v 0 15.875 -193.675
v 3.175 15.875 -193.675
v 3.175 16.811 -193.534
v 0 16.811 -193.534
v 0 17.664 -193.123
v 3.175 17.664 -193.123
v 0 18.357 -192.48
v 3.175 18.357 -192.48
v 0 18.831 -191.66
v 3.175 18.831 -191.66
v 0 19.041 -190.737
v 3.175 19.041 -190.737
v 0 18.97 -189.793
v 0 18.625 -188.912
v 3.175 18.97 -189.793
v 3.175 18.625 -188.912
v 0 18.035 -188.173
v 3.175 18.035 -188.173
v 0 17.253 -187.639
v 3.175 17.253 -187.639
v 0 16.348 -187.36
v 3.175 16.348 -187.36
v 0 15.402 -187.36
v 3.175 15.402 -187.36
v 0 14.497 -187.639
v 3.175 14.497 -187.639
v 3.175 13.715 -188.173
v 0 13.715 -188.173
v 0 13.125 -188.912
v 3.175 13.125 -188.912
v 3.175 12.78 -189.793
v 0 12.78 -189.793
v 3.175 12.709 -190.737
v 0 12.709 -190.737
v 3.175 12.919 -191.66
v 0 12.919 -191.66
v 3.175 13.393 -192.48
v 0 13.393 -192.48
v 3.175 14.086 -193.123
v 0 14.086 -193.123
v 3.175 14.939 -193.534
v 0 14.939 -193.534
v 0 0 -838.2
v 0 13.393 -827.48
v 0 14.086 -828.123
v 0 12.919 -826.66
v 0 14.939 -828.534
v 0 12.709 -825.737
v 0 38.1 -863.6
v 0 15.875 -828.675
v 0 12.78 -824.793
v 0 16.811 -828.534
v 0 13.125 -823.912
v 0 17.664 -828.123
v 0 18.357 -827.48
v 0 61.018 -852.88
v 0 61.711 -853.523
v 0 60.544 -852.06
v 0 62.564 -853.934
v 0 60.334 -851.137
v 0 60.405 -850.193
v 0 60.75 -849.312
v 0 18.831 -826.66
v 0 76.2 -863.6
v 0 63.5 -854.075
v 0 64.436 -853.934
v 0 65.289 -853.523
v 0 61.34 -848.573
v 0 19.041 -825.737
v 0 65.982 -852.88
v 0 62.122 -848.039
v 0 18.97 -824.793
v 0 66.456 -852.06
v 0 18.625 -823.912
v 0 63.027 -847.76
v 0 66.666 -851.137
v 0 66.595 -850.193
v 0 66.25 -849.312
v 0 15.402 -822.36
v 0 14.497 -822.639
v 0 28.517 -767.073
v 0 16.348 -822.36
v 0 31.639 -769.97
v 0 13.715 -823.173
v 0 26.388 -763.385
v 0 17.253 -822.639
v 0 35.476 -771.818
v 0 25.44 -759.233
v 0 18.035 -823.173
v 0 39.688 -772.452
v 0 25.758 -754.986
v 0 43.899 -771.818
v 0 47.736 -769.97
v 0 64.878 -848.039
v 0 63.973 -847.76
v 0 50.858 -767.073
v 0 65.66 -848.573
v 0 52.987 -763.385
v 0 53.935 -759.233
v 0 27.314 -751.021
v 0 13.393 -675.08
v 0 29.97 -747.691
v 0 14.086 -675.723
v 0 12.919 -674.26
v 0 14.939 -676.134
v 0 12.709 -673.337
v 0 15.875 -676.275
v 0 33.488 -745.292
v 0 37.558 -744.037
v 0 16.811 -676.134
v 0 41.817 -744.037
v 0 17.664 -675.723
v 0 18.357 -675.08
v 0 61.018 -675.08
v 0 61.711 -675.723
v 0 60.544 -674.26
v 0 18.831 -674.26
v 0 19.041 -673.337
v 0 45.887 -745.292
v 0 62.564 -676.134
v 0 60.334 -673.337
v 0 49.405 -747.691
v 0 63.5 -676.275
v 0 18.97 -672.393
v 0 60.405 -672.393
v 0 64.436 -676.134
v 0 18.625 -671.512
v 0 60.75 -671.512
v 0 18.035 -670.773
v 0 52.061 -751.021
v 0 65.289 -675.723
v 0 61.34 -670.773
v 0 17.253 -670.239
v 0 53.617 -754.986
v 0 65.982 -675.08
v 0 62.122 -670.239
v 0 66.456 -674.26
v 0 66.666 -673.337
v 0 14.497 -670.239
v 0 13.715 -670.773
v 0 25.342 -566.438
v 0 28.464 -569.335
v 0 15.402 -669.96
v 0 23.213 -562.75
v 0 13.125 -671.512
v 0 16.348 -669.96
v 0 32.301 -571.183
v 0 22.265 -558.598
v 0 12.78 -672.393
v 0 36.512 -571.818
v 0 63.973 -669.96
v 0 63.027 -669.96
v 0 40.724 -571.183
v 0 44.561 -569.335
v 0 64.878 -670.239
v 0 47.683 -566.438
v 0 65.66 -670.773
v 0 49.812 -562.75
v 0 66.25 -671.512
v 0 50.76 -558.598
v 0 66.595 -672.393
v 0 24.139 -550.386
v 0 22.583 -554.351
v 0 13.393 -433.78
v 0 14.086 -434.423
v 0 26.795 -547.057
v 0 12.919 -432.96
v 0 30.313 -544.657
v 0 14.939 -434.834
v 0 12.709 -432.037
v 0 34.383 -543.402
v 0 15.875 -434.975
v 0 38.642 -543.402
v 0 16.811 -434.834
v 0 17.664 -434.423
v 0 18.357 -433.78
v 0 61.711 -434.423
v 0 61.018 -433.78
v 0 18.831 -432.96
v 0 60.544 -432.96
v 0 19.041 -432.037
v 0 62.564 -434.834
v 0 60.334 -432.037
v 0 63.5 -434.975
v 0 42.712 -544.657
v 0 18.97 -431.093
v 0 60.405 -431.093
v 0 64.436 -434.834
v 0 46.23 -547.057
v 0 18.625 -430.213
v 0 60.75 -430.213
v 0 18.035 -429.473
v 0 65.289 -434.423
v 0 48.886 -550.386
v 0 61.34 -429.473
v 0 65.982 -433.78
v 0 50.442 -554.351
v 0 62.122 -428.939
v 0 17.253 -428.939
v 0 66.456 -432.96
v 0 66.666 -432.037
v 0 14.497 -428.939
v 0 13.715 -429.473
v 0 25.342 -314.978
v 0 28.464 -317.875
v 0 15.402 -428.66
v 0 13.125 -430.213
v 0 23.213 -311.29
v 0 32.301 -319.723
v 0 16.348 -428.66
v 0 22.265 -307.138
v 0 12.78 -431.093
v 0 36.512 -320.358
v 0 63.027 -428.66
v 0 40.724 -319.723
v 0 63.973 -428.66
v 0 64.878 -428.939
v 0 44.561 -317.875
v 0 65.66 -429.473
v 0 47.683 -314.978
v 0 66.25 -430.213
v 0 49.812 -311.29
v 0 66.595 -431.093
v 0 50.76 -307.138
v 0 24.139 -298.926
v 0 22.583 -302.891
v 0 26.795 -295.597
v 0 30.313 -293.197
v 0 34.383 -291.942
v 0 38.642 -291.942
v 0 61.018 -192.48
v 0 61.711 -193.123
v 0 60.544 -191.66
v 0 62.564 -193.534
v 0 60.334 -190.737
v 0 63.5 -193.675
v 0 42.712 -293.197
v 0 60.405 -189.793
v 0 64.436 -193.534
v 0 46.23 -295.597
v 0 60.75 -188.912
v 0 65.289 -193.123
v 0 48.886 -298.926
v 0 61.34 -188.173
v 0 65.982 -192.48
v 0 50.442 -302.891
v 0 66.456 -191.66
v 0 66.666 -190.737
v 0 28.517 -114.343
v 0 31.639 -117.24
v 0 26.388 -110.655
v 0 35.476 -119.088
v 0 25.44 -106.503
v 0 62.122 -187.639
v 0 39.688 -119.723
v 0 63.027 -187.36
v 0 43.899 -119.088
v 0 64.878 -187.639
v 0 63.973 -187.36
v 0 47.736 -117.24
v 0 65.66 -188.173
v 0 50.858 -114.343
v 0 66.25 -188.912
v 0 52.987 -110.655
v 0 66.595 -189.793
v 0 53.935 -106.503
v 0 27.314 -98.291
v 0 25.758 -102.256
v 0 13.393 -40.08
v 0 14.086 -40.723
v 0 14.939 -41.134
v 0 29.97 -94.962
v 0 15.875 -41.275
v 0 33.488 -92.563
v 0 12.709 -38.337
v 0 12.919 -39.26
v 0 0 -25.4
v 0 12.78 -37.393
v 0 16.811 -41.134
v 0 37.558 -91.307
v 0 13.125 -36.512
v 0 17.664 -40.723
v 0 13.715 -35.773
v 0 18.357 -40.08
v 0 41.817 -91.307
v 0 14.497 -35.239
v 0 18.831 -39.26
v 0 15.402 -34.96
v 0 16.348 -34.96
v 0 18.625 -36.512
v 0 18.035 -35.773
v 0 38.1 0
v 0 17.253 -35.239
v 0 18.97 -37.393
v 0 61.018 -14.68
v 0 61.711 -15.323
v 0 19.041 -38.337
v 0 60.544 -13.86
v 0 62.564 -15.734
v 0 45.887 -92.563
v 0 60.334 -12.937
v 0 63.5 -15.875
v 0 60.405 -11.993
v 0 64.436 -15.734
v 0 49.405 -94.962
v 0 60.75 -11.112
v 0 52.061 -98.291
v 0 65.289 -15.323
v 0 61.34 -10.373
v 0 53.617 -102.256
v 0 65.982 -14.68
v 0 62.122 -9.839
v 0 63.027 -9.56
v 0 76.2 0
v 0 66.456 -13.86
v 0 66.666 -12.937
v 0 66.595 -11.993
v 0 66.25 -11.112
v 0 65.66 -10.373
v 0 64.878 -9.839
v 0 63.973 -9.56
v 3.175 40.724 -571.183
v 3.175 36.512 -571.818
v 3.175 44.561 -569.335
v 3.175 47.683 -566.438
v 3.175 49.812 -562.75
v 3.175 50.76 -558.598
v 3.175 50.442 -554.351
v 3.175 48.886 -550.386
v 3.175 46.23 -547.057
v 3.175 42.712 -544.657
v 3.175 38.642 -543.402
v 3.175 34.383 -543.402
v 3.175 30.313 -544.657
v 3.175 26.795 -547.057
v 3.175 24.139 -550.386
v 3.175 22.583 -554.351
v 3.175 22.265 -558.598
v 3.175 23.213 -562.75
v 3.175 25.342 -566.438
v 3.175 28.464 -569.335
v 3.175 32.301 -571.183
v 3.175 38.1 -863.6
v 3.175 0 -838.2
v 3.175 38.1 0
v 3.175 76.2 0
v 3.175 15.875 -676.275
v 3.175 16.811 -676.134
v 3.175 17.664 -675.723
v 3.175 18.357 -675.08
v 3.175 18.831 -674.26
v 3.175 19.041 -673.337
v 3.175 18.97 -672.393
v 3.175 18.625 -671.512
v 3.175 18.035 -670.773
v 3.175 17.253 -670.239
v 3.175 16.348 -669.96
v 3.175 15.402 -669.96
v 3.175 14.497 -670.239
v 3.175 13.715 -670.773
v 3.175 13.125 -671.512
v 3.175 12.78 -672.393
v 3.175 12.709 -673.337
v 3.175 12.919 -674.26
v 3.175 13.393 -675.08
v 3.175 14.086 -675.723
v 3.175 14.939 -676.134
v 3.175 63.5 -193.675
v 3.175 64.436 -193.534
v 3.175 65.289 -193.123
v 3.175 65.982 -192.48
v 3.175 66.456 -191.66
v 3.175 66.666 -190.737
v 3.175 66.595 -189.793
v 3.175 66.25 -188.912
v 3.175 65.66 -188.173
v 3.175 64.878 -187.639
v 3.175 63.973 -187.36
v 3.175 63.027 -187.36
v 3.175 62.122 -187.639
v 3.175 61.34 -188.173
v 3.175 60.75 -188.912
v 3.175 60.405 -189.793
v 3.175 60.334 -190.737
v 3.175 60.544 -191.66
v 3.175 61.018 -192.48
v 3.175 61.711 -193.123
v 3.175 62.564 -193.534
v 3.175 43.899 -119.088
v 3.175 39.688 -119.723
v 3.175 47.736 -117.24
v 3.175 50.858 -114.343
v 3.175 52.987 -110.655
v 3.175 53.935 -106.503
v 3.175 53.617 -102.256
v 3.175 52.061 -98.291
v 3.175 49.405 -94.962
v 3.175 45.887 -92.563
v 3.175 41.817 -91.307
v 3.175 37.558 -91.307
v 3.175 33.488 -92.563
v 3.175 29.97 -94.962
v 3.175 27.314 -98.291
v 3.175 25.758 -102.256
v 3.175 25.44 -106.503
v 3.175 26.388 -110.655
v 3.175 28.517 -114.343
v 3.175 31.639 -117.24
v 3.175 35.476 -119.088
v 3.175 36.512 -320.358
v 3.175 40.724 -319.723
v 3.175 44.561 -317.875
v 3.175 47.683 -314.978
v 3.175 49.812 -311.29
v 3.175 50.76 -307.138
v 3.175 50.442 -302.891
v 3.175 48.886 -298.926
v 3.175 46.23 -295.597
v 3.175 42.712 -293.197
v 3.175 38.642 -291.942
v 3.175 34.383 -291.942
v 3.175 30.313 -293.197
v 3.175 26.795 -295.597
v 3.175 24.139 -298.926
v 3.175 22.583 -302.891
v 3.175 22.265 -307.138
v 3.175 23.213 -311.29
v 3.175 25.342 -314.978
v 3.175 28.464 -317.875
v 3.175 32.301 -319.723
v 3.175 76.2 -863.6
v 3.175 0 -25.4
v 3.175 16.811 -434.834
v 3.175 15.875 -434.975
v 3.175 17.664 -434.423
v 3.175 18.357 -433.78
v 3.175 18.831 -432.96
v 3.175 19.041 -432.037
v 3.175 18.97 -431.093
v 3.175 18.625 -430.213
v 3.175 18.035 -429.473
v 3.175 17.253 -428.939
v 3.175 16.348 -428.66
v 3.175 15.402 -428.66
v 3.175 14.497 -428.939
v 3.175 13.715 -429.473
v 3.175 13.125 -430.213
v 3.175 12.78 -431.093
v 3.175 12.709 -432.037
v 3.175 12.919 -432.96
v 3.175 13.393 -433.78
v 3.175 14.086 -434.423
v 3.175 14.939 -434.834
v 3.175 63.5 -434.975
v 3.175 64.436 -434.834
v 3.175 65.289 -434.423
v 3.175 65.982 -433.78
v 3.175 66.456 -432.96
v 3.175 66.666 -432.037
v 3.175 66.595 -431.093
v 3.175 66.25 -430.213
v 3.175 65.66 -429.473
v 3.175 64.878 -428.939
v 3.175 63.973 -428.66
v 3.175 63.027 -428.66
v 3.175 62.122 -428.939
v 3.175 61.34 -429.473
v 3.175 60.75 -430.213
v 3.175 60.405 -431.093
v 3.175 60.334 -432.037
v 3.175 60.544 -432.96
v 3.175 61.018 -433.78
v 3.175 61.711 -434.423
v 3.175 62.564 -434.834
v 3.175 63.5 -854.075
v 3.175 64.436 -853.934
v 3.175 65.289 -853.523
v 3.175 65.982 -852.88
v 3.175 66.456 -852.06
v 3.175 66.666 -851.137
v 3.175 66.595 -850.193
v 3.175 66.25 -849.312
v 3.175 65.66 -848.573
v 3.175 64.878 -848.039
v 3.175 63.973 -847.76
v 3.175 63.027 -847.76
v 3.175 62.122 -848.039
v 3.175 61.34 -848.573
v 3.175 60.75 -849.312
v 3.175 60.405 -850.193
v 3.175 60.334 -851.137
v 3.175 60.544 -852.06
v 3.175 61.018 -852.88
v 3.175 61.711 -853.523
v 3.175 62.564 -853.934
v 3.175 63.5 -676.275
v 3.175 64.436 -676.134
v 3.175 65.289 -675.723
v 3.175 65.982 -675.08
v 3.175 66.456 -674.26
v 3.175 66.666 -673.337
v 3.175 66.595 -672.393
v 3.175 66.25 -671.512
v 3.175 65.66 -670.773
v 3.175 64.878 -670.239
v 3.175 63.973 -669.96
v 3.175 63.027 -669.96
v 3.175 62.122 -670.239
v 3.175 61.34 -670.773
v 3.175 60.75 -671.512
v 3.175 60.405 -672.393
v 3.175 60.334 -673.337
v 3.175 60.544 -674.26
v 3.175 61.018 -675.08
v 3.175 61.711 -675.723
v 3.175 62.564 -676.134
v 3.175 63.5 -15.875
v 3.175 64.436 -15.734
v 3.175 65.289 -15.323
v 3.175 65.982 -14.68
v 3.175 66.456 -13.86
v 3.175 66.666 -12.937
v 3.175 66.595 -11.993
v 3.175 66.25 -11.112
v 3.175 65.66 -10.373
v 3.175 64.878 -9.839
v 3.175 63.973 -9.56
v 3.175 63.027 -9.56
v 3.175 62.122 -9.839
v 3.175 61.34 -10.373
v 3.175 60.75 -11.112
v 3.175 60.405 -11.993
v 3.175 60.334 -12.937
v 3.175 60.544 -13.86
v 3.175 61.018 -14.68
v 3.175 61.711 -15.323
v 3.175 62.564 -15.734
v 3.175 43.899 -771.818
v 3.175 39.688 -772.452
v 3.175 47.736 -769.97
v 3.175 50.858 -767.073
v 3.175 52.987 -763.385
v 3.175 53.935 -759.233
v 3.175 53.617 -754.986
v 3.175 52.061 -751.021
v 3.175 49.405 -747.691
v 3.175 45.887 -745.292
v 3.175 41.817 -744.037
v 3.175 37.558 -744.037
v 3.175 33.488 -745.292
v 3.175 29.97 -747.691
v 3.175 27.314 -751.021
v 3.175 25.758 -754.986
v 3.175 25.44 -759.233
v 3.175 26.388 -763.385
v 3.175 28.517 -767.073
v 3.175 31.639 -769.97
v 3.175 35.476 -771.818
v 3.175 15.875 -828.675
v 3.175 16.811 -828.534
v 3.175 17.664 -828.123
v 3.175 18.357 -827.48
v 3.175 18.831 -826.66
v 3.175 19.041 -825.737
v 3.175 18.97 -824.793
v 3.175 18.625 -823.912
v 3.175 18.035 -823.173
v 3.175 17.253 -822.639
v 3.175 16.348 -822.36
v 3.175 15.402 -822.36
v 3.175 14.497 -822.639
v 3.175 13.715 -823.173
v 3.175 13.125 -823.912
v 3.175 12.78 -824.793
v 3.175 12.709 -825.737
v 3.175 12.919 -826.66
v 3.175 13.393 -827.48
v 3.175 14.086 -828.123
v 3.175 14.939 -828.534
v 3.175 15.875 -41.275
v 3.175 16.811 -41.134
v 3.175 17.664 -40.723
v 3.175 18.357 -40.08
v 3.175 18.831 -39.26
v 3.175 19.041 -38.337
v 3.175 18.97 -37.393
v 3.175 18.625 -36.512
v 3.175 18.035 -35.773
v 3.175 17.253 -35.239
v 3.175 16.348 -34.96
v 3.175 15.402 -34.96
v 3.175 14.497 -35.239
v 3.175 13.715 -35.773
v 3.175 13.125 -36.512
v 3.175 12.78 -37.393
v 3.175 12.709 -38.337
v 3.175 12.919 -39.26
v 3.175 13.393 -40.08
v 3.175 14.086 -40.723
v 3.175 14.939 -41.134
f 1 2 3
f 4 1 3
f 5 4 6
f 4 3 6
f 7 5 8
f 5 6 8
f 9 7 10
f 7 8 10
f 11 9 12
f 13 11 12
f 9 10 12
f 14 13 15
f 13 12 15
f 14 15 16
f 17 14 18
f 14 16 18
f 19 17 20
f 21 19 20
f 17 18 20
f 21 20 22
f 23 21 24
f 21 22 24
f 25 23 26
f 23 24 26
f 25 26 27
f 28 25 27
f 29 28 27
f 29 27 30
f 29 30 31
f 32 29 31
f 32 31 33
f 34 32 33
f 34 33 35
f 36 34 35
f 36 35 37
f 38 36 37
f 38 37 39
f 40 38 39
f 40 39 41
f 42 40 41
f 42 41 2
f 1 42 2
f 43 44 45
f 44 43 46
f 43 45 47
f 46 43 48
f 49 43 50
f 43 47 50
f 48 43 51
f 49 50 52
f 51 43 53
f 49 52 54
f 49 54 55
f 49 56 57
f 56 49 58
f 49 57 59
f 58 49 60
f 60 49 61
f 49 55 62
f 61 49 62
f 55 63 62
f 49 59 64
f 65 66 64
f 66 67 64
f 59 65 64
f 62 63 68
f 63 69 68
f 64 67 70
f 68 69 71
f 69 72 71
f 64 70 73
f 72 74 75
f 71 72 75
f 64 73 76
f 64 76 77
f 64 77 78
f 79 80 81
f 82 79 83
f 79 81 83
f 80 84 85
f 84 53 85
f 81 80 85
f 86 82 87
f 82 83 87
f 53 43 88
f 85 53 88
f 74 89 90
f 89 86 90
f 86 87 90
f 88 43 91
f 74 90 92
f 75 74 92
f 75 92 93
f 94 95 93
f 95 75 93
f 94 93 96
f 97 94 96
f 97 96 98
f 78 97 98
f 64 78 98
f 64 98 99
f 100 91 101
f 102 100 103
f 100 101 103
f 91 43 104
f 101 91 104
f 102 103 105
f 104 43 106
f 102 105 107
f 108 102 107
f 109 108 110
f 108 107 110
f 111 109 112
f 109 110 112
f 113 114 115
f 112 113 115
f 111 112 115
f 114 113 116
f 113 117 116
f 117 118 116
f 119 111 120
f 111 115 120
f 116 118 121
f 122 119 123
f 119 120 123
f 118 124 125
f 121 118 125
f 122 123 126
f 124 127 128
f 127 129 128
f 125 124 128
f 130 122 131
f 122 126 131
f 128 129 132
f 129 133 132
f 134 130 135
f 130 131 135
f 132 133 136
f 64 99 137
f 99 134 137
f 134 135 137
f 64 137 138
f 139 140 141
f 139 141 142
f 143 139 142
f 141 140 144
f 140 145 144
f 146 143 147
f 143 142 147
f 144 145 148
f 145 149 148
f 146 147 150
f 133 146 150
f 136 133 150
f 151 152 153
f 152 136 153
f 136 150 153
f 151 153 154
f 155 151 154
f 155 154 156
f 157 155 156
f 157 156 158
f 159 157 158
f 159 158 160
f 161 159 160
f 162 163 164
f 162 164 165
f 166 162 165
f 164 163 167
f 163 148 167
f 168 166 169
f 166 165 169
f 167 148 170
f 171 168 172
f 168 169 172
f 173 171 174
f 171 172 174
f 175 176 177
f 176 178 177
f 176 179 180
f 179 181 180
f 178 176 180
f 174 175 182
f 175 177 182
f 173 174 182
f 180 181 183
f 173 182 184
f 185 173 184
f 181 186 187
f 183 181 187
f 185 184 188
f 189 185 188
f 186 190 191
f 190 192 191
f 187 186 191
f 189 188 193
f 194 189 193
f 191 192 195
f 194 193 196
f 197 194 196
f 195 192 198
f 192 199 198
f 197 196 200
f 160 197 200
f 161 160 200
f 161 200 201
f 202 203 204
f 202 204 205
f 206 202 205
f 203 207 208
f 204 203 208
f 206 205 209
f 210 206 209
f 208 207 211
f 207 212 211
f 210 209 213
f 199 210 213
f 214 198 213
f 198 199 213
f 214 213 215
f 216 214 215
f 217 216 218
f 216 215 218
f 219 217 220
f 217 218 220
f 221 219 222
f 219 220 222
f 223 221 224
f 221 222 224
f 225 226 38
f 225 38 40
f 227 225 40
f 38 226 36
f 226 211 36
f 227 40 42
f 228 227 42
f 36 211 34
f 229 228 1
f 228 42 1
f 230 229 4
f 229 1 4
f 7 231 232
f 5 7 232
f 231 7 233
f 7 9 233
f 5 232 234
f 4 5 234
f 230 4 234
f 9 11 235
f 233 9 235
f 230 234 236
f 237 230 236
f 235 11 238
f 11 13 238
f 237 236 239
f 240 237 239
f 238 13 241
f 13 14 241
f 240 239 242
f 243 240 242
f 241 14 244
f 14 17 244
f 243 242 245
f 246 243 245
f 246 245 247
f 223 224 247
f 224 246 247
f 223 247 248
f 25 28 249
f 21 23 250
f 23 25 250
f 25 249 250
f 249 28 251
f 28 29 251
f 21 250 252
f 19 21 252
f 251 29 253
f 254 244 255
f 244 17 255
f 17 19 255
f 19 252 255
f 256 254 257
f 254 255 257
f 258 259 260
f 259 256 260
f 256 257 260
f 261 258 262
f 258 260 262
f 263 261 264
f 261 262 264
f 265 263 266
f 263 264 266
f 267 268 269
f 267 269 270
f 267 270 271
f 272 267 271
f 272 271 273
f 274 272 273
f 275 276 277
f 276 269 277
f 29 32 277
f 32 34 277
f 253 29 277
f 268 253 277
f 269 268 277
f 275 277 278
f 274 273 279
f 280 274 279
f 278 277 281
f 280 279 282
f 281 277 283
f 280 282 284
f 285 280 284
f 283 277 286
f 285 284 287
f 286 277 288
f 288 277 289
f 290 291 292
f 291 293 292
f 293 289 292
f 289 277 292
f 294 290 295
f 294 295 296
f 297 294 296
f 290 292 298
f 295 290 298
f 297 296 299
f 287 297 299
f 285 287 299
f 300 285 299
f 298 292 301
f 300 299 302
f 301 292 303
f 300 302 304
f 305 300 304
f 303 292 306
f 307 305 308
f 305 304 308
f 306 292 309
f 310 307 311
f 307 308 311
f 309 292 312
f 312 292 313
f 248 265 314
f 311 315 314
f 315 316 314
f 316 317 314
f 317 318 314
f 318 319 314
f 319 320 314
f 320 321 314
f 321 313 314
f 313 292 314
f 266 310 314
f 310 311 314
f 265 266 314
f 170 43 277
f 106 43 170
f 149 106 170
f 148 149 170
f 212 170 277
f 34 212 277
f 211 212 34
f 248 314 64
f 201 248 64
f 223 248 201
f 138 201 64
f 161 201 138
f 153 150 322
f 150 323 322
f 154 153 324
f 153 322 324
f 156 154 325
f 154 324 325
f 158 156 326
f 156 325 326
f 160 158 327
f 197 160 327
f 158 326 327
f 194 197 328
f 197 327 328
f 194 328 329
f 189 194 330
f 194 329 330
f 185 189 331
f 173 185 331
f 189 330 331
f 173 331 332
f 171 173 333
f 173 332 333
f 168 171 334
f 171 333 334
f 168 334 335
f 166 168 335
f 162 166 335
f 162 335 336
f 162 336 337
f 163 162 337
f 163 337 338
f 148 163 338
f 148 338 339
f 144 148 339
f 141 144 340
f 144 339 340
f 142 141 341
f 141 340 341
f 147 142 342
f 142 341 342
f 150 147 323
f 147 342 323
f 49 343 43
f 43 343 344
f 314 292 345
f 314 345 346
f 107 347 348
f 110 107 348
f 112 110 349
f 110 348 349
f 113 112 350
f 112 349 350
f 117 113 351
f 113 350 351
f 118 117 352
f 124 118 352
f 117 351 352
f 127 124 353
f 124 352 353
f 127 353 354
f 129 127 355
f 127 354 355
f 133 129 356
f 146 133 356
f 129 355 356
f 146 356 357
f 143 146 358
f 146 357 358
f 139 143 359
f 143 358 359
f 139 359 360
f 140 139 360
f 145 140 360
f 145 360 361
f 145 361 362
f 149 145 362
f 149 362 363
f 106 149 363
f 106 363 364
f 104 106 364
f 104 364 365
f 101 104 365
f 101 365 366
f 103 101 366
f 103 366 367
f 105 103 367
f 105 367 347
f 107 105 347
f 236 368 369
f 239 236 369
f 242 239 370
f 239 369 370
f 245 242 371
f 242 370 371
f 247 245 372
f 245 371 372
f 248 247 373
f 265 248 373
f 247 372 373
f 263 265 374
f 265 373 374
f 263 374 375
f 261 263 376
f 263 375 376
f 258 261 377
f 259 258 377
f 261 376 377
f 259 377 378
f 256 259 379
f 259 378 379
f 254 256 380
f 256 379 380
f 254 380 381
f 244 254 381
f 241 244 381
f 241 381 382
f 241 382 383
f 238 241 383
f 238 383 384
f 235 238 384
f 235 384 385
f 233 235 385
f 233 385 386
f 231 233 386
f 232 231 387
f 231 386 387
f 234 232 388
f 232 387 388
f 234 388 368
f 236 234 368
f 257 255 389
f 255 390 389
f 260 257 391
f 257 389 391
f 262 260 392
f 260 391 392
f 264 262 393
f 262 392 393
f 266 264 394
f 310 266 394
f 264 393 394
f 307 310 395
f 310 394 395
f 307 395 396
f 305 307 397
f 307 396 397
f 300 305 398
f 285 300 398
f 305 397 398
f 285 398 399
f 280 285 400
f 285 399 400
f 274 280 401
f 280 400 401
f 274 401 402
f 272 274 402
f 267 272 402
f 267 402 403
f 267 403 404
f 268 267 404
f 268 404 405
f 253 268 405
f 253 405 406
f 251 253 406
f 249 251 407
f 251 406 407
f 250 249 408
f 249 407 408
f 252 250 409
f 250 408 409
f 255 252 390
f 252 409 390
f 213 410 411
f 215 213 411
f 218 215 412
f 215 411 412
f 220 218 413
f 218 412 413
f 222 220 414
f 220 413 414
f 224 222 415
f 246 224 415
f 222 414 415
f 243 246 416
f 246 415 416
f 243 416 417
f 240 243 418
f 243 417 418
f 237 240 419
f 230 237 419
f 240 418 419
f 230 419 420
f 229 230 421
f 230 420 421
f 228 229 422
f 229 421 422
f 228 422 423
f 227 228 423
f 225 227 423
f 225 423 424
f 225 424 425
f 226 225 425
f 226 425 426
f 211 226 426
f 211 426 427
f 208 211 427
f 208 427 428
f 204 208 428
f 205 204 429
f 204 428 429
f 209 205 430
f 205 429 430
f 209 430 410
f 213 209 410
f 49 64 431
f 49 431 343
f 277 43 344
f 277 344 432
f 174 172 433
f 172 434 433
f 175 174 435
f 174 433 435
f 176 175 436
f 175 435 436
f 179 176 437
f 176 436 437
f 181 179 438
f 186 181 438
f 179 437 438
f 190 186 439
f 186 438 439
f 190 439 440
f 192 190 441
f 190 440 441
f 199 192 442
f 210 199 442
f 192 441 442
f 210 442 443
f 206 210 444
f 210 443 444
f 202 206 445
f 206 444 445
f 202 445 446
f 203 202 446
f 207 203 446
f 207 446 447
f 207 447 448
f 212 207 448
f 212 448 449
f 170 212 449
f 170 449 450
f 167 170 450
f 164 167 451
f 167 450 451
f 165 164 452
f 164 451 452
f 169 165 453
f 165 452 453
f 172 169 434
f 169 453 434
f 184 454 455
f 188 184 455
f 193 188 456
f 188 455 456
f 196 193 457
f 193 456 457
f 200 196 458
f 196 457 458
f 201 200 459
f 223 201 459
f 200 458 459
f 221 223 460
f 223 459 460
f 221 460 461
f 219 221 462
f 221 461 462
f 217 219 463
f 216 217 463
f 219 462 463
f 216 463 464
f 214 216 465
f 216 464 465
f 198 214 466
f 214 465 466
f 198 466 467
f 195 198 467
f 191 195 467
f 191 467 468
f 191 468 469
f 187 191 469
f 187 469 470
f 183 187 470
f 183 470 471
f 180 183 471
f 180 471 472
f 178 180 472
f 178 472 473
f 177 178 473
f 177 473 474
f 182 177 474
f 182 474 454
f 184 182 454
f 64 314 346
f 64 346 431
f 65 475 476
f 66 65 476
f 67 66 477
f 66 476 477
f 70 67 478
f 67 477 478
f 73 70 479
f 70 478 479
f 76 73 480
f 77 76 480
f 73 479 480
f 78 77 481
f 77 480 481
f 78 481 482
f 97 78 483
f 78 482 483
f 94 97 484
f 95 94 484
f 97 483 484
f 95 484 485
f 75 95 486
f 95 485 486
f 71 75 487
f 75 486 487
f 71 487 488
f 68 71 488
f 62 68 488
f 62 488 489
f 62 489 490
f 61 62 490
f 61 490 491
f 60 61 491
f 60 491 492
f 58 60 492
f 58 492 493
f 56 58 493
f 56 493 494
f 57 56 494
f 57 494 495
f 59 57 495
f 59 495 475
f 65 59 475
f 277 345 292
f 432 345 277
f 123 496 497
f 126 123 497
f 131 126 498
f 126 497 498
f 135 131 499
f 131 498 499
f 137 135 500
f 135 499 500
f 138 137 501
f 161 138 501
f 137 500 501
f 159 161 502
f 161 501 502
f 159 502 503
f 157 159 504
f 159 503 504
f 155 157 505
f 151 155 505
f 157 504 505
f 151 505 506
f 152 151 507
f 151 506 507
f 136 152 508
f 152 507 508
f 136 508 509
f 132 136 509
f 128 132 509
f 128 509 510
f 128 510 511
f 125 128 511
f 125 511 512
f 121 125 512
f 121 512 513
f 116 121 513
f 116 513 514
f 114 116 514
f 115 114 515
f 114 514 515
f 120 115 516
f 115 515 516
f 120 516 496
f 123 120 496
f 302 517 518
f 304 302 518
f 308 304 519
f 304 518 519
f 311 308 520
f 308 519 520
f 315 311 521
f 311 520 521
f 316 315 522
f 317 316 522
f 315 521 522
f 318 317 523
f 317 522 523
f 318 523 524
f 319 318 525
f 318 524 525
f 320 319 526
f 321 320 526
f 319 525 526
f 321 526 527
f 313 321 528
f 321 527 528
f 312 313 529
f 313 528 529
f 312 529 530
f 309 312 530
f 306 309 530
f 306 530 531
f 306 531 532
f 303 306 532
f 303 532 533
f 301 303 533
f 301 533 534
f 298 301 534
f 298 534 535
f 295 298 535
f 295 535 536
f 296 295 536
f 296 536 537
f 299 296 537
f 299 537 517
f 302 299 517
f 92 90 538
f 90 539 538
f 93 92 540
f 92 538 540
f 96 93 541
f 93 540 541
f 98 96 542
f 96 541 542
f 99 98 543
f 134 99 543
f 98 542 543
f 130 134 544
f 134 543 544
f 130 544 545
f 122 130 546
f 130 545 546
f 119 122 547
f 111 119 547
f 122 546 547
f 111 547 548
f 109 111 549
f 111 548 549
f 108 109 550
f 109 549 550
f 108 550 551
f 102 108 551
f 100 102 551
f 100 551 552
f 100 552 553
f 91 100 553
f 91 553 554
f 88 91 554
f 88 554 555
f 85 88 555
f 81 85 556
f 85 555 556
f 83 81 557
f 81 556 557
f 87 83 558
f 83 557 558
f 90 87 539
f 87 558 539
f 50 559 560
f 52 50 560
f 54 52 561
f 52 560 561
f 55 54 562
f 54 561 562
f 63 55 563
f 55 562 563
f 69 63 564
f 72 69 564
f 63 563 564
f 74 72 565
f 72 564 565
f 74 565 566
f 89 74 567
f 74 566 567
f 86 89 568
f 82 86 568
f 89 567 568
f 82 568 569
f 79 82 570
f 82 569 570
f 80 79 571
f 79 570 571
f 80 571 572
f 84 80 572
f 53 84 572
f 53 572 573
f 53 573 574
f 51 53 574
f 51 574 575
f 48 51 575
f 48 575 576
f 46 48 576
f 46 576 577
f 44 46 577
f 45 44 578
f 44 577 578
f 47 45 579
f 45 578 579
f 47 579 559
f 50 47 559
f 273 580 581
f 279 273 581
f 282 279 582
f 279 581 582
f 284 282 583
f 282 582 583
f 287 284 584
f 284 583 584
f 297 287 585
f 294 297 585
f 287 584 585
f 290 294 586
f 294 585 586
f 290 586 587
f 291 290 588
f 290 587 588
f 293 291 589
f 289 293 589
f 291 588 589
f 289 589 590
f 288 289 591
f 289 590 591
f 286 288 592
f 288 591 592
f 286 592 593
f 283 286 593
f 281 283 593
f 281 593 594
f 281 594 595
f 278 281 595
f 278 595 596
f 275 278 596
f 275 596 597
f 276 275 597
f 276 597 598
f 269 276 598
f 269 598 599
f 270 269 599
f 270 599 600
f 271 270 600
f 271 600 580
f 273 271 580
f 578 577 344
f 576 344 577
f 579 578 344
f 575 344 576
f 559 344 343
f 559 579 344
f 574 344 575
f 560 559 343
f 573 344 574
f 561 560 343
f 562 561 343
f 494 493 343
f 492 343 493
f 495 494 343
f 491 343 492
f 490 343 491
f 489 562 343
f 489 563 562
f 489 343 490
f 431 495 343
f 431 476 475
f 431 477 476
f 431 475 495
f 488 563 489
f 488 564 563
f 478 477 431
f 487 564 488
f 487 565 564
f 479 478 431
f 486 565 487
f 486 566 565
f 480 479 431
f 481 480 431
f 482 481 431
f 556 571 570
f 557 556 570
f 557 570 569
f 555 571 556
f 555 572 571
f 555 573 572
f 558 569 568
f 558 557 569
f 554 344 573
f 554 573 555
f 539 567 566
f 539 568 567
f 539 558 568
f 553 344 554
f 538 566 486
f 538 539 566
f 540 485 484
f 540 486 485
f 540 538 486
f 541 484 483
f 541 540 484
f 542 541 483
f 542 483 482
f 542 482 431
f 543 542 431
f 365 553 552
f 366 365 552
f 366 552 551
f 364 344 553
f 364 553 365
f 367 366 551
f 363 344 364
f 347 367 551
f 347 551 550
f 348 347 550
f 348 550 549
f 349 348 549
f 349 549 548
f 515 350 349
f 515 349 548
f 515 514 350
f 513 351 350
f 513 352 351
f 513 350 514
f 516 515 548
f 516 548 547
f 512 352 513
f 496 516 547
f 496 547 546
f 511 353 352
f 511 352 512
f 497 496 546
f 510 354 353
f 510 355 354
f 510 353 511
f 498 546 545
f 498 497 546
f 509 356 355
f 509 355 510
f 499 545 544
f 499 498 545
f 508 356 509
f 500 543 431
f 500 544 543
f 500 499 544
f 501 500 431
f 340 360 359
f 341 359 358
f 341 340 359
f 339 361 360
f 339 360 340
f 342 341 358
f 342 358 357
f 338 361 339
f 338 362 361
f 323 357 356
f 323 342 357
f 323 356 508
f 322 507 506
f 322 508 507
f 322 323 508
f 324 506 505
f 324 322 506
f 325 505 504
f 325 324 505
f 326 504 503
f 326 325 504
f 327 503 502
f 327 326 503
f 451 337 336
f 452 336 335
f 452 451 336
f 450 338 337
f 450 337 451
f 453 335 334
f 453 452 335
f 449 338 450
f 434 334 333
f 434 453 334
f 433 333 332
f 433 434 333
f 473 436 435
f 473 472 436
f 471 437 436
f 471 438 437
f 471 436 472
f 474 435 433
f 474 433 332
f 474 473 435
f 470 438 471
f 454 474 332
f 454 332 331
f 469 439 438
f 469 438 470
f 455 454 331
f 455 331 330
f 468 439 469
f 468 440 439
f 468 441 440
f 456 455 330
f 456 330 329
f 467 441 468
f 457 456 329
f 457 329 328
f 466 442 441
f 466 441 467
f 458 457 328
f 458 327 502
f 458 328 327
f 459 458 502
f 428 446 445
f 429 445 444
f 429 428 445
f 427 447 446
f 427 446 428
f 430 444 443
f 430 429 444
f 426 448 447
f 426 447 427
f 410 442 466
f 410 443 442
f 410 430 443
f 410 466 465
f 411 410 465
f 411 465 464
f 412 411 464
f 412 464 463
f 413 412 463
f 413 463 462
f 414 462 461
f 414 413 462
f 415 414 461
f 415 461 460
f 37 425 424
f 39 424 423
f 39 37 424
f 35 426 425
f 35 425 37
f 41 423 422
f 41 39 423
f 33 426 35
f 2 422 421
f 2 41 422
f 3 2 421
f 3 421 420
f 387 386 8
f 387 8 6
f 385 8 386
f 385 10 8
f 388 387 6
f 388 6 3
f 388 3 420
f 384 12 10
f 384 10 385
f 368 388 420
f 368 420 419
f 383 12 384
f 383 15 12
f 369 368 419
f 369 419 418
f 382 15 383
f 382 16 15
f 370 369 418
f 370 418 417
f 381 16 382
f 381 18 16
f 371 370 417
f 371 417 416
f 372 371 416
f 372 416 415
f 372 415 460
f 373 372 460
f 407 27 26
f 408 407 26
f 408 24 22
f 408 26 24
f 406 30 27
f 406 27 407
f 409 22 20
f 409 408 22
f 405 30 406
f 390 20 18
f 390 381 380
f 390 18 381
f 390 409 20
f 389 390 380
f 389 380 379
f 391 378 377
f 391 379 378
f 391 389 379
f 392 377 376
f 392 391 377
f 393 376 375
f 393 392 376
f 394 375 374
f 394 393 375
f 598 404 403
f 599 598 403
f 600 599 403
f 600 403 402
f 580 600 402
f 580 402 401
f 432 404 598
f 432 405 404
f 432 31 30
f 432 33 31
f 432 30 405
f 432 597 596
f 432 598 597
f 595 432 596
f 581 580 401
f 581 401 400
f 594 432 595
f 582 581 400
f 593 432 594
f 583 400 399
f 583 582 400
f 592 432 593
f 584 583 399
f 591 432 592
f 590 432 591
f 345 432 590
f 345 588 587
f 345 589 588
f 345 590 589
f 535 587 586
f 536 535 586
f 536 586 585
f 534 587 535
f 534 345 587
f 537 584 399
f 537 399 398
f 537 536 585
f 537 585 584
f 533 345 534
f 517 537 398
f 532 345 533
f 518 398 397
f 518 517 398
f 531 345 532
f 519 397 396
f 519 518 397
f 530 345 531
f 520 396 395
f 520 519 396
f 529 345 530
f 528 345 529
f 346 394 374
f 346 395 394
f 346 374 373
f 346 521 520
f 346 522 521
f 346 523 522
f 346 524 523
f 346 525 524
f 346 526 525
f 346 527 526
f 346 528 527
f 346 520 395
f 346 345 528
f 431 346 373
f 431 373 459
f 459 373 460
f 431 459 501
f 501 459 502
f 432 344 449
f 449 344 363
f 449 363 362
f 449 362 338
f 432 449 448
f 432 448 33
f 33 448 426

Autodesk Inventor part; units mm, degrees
ref_plane "YZ Plane" through (0, 0, 0) normal (1, 0, 0) x (0, 1, 0)
ref_plane "XZ Plane" through (0, 0, 0) normal (0, 1, 0) x (-1, 0, 0)
ref_plane "XY Plane" through (0, 0, 0) normal (0, 0, 1) x (1, 0, 0)
sketch "Sketch1" plane through (0, 0, 0) normal (1, 0, 0) x (0, 1, 0)
  line L0 (0, 0) -> (76.2, 0)
  line L1 (76.2, 0) -> (76.2, -863.6)
  line L2 (76.2, -863.6) -> (0, -863.6)
  line L3 (0, -863.6) -> (0, 0)
  dimension "d0" = 76.2
  dimension "d1" = 863.6
extrude "Extrusion1" add sketch "Sketch1" along normal blind 3.175
sketch "Sketch2" plane through (3.175, 0, 0) normal (1, 0, 0) x (0, 0, -1)
  line L0 (0, 38.1) -> (0, 36.5125)
  line L1 (0, 36.5125) -> (0, 39.6875)
  circle A0 centre (306.07, 36.5125) radius 14.2875
  circle A1 centre (557.53, 36.5125) radius 14.2875
  circle A2 centre (105.4351, 39.6875) radius 14.2875
  circle A3 centre (758.1649, 39.6875) radius 14.2875
  line L2 (863.6, 0) -> (838.2, 0)
  line L3 (863.6, 0) -> (863.6, 38.1)
  line L4 (863.6, 38.1) -> (838.2, 0)
  circle A4 centre (12.7, 63.5) radius 3.175
  line L5 (863.6, 76.2) -> (0, 76.2) projected
  circle A5 centre (850.9, 63.5) radius 3.175
  circle A6 centre (825.5, 15.875) radius 3.175
  circle A7 centre (38.1, 15.875) radius 3.175
  circle A8 centre (190.5, 15.875) radius 3.175
  circle A9 centre (431.8, 15.875) radius 3.175
  circle A10 centre (431.8, 63.5) radius 3.175
  circle A11 centre (673.1, 63.5) radius 3.175
  circle A12 centre (673.1, 15.875) radius 3.175
  circle A13 centre (190.5, 63.5) radius 3.175
  line L6 (0, 0) -> (25.4, 0)
  line L7 (0, 0) -> (0, 38.1)
  line L8 (0, 38.1) -> (25.4, 0)
  line L9 (863.6, 0) -> (0, 0) projected
  dimension "d15" = 28.575
  dimension "d16" = 28.575
  dimension "d19" = 28.575
  dimension "d21" = 28.575
  dimension "d22" = 25.4
  dimension "d26" = 6.35
  dimension "d27" = 12.7
  dimension "d29" = 6.35
  dimension "d30" = 12.7
  dimension "d32" = 6.35
  dimension "d34" = 12.7
  dimension "d35" = 6.35
  dimension "d39" = 6.35
  dimension "d40" = 863.6
  dimension "d41" = 6.35
  dimension "d43" = 6.35
  dimension "d44" = 12.7
  dimension "d45" = 6.35
  dimension "d46" = 6.35
  dimension "d48" = 241.3
  dimension "d49" = 241.3
  dimension "d50" = 6.35
  dimension "d51" = 241.3
  dimension "d53" = 241.3
  dimension "d54" = 25.4
  dimension "d55" = 38.1
  dimension "d58" = 15.875
  dimension "d59" = 15.875
  dimension "d60" = 15.875
extrude "Extrusion3" cut sketch "Sketch2" against normal blind 25.4
properties part number "OutsidePlate"
